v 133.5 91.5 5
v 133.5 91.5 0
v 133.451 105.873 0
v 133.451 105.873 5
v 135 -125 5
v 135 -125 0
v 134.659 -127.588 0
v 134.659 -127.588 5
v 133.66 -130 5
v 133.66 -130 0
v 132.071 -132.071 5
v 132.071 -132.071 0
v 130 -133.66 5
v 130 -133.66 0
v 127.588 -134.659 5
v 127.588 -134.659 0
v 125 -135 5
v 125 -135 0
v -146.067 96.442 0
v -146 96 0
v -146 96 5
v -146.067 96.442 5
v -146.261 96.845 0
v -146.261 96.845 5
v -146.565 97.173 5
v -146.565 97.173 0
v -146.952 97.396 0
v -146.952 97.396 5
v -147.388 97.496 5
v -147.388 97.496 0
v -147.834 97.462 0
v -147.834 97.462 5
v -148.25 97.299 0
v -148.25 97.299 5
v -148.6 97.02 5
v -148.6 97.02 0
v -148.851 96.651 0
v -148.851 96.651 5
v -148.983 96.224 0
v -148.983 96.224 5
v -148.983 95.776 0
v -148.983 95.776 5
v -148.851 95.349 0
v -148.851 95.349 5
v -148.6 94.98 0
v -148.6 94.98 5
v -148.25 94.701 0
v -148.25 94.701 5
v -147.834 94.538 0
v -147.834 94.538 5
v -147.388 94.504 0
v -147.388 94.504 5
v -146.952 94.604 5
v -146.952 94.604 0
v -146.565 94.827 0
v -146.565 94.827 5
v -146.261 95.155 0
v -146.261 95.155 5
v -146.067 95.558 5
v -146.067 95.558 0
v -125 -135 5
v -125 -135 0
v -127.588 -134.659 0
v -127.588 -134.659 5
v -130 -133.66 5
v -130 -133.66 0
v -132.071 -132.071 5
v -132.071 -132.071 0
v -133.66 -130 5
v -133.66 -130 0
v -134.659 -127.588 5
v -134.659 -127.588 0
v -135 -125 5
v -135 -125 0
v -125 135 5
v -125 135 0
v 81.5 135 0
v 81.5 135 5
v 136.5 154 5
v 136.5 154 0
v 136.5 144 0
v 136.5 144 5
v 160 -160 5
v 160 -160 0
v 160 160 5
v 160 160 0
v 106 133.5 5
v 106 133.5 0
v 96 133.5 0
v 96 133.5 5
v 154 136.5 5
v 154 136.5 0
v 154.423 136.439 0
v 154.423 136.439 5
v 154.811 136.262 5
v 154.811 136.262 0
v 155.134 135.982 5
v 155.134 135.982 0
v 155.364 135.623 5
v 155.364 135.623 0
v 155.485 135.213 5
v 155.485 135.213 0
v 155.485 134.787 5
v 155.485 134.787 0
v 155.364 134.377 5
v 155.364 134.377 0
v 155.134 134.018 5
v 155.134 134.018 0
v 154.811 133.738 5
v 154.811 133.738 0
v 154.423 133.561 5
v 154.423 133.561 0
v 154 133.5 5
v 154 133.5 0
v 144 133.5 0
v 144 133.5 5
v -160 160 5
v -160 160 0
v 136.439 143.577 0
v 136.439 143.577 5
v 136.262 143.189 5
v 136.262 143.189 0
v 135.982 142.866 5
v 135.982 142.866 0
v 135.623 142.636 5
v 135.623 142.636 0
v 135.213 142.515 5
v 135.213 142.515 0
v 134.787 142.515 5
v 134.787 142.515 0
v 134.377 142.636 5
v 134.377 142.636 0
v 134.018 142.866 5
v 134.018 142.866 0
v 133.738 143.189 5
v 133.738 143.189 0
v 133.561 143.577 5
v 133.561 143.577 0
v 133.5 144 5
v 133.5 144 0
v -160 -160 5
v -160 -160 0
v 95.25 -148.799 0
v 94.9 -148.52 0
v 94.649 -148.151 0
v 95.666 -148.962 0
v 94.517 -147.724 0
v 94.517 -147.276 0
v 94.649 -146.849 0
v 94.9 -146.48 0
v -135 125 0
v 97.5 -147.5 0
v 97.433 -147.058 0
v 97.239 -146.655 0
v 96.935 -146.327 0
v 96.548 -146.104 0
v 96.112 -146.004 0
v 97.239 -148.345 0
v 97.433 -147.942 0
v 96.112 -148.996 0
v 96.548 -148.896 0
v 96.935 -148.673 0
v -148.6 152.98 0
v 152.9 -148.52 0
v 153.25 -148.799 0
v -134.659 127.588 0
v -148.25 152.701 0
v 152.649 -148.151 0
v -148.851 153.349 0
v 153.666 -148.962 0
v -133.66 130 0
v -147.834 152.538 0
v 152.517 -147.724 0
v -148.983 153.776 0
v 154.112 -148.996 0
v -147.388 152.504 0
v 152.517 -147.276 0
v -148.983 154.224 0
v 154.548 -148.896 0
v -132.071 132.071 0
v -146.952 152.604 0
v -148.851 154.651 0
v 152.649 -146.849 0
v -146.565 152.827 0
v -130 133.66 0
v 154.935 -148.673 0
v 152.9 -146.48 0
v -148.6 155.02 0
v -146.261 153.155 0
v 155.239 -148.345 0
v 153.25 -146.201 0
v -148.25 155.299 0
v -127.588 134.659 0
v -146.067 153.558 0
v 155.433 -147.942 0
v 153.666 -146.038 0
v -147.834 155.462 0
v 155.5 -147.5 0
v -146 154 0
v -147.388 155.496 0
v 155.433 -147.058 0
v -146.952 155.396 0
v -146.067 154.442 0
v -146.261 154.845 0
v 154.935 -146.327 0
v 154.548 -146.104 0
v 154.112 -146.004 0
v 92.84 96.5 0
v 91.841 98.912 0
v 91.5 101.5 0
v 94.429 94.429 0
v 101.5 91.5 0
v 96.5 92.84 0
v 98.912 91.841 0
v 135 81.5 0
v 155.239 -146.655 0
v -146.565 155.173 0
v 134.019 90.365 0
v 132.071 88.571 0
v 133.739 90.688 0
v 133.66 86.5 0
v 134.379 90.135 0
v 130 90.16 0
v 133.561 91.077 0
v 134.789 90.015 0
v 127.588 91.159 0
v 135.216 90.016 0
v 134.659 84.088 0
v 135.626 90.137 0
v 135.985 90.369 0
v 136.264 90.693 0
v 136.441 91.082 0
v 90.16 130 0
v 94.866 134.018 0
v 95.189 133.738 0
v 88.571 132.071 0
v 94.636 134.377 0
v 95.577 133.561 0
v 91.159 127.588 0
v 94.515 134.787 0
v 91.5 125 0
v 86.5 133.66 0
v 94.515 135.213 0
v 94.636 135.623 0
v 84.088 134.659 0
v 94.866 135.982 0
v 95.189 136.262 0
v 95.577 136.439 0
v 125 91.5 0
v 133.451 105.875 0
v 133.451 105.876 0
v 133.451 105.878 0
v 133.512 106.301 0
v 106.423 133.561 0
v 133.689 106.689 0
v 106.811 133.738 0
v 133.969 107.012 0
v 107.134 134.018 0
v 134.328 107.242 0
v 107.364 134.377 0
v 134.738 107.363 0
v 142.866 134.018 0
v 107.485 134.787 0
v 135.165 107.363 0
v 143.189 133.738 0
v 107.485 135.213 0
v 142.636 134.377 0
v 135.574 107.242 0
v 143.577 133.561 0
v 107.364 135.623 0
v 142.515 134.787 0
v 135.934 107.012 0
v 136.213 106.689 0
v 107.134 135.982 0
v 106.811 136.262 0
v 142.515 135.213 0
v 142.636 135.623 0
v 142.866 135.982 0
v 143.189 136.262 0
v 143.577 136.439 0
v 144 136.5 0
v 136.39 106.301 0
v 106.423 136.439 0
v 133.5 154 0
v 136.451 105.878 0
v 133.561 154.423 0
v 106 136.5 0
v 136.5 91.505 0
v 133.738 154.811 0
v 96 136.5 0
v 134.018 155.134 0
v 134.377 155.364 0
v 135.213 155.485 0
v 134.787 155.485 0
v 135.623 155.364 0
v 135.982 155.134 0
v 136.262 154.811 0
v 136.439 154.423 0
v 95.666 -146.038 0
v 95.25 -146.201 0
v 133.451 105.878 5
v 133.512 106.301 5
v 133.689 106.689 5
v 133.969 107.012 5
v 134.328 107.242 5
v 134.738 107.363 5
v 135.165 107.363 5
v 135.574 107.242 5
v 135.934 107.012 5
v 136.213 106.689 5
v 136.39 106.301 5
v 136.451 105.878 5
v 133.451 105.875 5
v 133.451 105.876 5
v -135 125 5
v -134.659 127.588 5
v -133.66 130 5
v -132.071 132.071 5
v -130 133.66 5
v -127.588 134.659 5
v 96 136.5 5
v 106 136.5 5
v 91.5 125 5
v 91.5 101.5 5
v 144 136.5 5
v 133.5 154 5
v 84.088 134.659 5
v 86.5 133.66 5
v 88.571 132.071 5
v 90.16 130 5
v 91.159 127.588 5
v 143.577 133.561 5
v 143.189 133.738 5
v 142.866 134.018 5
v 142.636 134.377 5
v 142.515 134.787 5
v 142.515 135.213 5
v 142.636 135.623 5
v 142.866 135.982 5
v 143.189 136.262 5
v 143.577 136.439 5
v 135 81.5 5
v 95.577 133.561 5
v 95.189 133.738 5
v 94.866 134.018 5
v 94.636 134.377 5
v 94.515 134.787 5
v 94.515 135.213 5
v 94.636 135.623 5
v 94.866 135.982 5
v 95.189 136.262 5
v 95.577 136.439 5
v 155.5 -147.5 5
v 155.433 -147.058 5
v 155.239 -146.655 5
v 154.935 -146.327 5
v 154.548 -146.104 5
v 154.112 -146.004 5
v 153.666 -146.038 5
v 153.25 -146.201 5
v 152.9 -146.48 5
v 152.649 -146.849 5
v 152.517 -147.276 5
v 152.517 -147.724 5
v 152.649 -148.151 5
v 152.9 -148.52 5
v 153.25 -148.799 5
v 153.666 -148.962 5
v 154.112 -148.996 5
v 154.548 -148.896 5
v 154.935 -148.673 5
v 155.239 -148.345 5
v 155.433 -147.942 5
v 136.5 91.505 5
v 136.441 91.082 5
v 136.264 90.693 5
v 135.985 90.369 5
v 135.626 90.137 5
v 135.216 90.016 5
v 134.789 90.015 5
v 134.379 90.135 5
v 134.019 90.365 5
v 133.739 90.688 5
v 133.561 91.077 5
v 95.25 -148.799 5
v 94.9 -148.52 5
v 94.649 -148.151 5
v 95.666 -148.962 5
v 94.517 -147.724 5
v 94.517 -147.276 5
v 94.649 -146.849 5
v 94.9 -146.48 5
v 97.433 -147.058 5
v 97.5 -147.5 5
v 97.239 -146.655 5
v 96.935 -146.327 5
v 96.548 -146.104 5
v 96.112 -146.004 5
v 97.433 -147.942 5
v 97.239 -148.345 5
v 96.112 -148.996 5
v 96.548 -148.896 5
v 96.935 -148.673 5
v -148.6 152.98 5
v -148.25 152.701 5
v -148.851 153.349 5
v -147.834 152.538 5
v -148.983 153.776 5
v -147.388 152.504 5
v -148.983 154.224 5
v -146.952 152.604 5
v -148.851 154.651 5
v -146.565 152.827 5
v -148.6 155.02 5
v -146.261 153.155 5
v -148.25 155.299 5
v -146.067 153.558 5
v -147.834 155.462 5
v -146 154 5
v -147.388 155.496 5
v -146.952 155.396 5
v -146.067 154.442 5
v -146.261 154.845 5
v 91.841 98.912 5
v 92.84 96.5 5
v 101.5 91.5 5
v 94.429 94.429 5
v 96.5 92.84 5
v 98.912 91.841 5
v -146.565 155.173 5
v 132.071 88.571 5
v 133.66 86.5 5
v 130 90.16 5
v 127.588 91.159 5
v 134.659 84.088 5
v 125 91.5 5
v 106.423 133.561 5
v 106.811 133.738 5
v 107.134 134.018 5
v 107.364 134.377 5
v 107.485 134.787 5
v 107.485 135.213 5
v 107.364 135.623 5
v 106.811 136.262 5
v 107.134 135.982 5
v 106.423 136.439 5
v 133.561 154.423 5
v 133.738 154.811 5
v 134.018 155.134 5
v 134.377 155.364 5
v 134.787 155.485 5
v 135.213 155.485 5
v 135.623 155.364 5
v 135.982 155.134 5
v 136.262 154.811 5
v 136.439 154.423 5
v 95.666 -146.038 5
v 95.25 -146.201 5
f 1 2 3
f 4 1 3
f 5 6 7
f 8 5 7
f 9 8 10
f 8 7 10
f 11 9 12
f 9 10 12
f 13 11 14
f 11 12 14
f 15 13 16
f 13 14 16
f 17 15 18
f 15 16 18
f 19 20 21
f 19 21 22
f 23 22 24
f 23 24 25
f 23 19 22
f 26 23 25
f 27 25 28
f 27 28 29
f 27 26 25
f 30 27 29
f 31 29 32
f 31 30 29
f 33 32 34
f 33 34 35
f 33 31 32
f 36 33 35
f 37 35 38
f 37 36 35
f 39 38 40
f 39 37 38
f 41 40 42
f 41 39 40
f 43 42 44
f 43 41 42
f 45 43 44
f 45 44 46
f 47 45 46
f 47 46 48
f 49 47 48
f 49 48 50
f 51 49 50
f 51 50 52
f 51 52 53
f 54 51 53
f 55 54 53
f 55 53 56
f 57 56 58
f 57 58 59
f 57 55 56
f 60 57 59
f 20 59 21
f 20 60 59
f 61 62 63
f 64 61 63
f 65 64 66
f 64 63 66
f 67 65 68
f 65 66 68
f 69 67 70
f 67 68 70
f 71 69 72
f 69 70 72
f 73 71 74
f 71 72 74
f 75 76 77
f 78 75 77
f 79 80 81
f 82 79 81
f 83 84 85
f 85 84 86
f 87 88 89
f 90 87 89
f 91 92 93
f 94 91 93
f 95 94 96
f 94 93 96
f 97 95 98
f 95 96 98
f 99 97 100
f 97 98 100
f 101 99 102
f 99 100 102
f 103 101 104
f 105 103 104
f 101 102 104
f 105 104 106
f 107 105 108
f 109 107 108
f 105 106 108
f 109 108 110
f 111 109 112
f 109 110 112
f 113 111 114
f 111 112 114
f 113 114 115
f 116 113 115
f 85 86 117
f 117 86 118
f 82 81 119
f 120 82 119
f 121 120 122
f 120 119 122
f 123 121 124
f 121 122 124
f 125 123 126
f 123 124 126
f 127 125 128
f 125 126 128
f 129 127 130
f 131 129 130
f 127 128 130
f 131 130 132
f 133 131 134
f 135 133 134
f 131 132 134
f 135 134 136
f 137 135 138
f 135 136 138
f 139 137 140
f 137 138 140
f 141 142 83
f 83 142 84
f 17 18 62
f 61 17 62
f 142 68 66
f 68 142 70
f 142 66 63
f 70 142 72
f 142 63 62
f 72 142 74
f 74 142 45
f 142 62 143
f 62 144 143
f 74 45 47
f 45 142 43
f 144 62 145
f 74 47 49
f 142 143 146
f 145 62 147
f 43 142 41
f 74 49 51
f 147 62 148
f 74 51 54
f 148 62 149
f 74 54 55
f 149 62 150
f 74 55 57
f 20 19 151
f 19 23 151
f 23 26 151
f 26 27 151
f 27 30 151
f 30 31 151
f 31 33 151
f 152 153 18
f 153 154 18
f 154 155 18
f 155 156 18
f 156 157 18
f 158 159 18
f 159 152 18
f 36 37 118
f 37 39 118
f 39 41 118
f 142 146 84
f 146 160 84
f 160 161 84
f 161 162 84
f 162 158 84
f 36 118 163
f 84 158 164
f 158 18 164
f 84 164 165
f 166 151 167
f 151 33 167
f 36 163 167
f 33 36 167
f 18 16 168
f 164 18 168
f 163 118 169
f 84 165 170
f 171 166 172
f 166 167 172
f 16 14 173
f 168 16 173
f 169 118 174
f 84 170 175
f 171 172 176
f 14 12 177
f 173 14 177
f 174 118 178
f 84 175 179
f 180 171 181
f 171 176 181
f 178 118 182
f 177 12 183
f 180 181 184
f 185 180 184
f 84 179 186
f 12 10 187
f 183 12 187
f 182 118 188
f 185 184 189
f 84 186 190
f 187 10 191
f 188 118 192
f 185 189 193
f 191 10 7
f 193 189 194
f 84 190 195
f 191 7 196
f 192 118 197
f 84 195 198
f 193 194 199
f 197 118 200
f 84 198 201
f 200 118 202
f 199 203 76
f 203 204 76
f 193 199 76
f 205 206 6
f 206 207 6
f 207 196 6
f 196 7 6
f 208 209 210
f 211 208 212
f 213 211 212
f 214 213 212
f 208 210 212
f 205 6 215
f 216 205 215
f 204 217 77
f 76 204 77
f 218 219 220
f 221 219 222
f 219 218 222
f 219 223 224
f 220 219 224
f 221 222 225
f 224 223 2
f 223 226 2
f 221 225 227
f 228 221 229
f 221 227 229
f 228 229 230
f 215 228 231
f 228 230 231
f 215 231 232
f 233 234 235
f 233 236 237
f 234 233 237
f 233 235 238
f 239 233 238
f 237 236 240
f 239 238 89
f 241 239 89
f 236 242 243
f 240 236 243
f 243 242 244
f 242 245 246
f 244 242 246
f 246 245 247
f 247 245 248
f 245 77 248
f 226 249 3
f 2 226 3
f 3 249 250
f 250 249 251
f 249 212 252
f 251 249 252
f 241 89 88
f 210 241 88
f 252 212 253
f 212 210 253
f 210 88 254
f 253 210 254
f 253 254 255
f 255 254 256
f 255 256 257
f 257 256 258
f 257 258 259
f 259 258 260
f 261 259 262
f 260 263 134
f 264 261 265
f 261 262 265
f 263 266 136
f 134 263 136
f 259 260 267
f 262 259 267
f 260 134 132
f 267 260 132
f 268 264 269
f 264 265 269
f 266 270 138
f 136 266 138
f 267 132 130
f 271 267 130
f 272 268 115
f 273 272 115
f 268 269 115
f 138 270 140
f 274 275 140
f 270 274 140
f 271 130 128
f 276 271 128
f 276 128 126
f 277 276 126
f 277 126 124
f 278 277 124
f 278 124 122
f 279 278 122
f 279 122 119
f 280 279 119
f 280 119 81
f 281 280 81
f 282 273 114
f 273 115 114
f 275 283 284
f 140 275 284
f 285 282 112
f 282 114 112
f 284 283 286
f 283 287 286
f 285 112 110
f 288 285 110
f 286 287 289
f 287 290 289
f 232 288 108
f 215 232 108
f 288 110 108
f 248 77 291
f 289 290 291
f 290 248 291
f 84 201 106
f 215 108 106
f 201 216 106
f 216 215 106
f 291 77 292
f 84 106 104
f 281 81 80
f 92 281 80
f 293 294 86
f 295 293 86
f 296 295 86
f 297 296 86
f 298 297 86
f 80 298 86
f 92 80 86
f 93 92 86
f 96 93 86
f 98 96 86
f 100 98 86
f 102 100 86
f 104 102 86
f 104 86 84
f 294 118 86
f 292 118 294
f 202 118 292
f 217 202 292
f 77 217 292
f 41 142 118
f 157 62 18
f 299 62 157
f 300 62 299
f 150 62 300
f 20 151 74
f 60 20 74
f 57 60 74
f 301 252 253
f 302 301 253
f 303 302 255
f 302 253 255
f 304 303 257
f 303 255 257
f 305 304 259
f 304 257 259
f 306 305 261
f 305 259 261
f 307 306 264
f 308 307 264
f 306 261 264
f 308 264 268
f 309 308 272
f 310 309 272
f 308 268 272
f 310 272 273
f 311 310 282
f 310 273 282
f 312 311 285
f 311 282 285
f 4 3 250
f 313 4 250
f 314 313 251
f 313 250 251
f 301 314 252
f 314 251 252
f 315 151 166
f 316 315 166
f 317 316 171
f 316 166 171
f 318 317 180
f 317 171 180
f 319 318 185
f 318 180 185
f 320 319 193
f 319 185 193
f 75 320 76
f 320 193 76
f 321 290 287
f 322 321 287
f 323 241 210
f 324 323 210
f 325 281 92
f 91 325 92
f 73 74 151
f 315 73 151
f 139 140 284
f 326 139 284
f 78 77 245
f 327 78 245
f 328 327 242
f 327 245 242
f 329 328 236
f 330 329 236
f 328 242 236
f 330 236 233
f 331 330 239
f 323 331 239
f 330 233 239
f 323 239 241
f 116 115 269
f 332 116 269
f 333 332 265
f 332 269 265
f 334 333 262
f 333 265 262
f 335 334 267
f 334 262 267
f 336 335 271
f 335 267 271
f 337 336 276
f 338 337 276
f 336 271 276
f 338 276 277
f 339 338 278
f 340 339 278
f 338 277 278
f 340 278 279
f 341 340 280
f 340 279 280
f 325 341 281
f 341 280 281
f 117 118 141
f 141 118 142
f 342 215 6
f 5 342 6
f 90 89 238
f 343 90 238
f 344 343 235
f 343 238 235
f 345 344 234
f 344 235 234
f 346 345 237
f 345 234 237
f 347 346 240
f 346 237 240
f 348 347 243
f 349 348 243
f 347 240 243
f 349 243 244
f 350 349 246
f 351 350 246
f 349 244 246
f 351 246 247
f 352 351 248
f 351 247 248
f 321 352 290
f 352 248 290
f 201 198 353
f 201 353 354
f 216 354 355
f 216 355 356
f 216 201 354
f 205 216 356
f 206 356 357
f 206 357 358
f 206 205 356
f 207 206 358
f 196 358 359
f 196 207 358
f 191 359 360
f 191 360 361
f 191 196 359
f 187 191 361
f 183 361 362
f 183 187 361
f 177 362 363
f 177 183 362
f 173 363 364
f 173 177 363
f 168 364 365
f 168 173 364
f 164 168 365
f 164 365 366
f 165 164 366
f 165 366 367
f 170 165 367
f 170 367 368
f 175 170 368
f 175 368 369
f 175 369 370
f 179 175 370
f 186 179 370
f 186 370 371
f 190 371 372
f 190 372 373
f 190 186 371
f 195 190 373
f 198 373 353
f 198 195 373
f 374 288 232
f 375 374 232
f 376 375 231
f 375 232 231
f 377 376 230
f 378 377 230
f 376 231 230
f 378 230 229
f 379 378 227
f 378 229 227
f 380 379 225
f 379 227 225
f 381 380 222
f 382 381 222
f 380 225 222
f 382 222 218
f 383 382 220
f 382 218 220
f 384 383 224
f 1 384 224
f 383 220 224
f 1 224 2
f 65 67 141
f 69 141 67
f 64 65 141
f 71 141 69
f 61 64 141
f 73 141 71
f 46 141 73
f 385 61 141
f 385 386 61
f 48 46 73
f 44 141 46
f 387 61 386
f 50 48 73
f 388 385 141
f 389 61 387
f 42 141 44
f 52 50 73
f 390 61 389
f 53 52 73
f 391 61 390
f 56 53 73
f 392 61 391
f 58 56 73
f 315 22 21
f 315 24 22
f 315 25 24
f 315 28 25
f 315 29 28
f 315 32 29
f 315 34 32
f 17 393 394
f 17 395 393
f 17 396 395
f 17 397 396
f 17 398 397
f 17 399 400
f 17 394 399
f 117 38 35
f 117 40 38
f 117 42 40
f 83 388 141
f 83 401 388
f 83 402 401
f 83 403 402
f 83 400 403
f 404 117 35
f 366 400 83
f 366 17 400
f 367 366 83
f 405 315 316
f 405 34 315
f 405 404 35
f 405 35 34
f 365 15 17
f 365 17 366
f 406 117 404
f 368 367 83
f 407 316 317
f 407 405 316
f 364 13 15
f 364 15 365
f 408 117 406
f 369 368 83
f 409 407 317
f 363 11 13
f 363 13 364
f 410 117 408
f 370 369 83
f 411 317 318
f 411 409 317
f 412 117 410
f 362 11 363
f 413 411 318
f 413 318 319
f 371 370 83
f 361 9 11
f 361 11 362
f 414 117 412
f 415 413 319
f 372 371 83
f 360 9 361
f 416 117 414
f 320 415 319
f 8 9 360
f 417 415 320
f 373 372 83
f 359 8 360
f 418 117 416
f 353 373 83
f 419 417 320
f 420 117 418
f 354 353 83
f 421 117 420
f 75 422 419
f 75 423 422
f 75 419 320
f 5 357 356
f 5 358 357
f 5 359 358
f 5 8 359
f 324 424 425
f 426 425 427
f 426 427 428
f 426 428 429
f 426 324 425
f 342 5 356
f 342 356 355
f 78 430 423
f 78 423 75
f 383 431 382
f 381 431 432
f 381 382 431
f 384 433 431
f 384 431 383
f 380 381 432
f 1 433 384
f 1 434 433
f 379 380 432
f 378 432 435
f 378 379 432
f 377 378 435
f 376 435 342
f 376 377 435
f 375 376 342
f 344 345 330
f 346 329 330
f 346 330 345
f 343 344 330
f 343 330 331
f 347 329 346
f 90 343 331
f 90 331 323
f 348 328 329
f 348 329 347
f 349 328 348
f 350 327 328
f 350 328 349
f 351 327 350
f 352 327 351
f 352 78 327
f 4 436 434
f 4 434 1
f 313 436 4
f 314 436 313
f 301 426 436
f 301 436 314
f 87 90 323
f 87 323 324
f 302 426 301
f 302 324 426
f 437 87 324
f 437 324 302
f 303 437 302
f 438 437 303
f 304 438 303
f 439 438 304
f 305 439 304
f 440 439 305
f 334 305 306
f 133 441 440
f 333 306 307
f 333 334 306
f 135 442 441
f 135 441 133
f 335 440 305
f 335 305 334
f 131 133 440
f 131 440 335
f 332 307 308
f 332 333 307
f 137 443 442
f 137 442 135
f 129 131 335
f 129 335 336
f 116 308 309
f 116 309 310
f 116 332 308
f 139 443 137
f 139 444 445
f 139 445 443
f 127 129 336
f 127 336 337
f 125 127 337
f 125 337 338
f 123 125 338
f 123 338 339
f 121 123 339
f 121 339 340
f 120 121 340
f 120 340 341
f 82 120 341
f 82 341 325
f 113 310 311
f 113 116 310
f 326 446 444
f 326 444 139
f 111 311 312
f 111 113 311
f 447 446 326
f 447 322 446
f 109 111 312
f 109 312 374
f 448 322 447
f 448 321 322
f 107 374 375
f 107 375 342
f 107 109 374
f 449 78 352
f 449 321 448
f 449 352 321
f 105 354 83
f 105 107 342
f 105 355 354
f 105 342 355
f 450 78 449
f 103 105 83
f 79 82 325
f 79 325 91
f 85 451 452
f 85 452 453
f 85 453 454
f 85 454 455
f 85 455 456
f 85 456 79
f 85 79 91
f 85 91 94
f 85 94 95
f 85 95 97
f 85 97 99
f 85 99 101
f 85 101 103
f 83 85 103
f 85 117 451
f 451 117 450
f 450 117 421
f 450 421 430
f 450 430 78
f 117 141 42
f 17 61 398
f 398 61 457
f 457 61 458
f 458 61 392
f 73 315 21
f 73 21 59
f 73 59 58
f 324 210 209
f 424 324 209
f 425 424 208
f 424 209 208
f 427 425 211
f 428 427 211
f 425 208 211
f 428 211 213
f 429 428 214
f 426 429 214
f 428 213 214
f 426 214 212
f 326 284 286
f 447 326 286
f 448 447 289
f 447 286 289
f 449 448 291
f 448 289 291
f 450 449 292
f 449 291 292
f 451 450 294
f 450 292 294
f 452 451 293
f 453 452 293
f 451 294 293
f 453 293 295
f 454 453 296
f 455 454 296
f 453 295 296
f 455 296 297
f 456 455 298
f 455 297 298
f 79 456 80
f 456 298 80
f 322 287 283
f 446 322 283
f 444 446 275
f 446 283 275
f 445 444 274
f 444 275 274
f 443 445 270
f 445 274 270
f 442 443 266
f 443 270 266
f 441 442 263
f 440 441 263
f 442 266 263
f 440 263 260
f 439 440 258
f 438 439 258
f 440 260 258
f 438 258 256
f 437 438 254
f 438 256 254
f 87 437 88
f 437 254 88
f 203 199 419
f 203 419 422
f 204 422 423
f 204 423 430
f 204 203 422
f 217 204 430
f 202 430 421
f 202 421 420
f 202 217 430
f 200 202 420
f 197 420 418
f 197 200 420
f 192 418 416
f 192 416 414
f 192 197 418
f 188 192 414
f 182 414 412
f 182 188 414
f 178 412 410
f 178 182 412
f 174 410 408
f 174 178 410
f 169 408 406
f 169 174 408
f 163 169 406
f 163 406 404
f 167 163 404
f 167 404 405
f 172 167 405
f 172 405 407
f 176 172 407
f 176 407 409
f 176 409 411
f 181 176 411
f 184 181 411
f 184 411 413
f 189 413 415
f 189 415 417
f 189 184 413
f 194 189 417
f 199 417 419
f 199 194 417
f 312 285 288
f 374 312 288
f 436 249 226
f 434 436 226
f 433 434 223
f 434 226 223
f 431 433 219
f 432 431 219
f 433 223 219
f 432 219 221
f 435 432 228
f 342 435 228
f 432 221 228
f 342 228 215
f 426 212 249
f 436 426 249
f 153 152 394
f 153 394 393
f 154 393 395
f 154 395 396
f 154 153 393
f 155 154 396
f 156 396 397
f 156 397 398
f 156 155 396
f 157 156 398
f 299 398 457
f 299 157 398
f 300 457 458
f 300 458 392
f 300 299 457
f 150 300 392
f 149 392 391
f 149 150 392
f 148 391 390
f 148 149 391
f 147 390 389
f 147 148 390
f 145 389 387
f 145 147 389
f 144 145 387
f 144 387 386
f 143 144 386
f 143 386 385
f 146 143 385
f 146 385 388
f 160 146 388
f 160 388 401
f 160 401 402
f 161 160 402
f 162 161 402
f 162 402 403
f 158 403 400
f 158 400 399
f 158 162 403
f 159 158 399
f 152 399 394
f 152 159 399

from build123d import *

# Parameters (mm, degrees)
F0_R     = 1.5
F1_DEPTH = 5


# Not quite as in the source:
# - ends of sketch curves that miss each other by under 0.0002 mm in the source are joined


with BuildPart() as f1:
    # F0 (on Top) → F1 (new body)
    with BuildSketch(Plane.XY):
        Polygon((-160, -160), (160, -160), (160, 110), (160, 160), (110, 160), (-160, 160), align=None)
        with Locations((96, -147.5)):
            Circle(F0_R, mode=Mode.SUBTRACT)
        with Locations((154, -147.5)):
            Circle(F0_R, mode=Mode.SUBTRACT)
        with Locations((-147.5, 96)):
            Circle(F0_R, mode=Mode.SUBTRACT)
        with Locations((-147.5, 154)):
            Circle(F0_R, mode=Mode.SUBTRACT)
        with BuildLine():
            ThreePointArc((135, -125), (132.0710678119, -132.0710678119), (125, -135))
            Line((125, -135), (-125, -135))
            ThreePointArc((-125, -135), (-132.0710678119, -132.0710678119), (-135, -125))
            Line((-135, -125), (-135, 125))
            ThreePointArc((-135, 125), (-132.0710678119, 132.0710678119), (-125, 135))
            Line((-125, 135), (81.5, 135))
            ThreePointArc((81.5, 135), (88.5710678119, 132.0710678119), (91.5, 125))
            Line((91.5, 125), (91.5, 101.5))
            ThreePointArc((91.5, 101.5), (94.4289321881, 94.4289321881), (101.5, 91.5))
            Line((101.5, 91.5), (125, 91.5))
            ThreePointArc((125, 91.5), (132.0710678119, 88.5710678119), (135, 81.5))
            Line((135, 81.5), (135, -125))
        make_face(mode=Mode.SUBTRACT)
        with BuildLine():
            ThreePointArc((133.4512195122, 105.877928352), (134.9512195122, 107.377928352), (136.4512195122, 105.877928352))
            Line((136.4512195122, 105.877928352), (136.499991364, 91.5050899728))
            ThreePointArc((136.499991364, 91.5050899728), (135.0025449901, 90.000002159), (133.5, 91.5))
            Line((133.5, 91.5), (133.451236778, 105.8728393094))
            ThreePointArc((133.451236778, 105.8728393094), (133.4512216704, 105.8753838124), (133.4512195122, 105.877928352))
        make_face(mode=Mode.SUBTRACT)
        with BuildLine():
            ThreePointArc((96, 133.5), (94.5, 135), (96, 136.5))
            Line((96, 136.5), (106, 136.5))
            ThreePointArc((106, 136.5), (107.5, 135), (106, 133.5))
            Line((106, 133.5), (96, 133.5))
        make_face(mode=Mode.SUBTRACT)
        with BuildLine():
            ThreePointArc((144, 133.5), (142.5, 135), (144, 136.5))
            Line((144, 136.5), (154, 136.5))
            ThreePointArc((154, 136.5), (155.5, 135), (154, 133.5))
            Line((154, 133.5), (144, 133.5))
        make_face(mode=Mode.SUBTRACT)
        with BuildLine():
            ThreePointArc((133.5, 154), (135, 155.5), (136.5, 154))
            Line((136.5, 154), (136.5, 144))
            ThreePointArc((136.5, 144), (135, 142.5), (133.5, 144))
            Line((133.5, 144), (133.5, 154))
        make_face(mode=Mode.SUBTRACT)
    extrude(amount=F1_DEPTH)


solid = f1.part
